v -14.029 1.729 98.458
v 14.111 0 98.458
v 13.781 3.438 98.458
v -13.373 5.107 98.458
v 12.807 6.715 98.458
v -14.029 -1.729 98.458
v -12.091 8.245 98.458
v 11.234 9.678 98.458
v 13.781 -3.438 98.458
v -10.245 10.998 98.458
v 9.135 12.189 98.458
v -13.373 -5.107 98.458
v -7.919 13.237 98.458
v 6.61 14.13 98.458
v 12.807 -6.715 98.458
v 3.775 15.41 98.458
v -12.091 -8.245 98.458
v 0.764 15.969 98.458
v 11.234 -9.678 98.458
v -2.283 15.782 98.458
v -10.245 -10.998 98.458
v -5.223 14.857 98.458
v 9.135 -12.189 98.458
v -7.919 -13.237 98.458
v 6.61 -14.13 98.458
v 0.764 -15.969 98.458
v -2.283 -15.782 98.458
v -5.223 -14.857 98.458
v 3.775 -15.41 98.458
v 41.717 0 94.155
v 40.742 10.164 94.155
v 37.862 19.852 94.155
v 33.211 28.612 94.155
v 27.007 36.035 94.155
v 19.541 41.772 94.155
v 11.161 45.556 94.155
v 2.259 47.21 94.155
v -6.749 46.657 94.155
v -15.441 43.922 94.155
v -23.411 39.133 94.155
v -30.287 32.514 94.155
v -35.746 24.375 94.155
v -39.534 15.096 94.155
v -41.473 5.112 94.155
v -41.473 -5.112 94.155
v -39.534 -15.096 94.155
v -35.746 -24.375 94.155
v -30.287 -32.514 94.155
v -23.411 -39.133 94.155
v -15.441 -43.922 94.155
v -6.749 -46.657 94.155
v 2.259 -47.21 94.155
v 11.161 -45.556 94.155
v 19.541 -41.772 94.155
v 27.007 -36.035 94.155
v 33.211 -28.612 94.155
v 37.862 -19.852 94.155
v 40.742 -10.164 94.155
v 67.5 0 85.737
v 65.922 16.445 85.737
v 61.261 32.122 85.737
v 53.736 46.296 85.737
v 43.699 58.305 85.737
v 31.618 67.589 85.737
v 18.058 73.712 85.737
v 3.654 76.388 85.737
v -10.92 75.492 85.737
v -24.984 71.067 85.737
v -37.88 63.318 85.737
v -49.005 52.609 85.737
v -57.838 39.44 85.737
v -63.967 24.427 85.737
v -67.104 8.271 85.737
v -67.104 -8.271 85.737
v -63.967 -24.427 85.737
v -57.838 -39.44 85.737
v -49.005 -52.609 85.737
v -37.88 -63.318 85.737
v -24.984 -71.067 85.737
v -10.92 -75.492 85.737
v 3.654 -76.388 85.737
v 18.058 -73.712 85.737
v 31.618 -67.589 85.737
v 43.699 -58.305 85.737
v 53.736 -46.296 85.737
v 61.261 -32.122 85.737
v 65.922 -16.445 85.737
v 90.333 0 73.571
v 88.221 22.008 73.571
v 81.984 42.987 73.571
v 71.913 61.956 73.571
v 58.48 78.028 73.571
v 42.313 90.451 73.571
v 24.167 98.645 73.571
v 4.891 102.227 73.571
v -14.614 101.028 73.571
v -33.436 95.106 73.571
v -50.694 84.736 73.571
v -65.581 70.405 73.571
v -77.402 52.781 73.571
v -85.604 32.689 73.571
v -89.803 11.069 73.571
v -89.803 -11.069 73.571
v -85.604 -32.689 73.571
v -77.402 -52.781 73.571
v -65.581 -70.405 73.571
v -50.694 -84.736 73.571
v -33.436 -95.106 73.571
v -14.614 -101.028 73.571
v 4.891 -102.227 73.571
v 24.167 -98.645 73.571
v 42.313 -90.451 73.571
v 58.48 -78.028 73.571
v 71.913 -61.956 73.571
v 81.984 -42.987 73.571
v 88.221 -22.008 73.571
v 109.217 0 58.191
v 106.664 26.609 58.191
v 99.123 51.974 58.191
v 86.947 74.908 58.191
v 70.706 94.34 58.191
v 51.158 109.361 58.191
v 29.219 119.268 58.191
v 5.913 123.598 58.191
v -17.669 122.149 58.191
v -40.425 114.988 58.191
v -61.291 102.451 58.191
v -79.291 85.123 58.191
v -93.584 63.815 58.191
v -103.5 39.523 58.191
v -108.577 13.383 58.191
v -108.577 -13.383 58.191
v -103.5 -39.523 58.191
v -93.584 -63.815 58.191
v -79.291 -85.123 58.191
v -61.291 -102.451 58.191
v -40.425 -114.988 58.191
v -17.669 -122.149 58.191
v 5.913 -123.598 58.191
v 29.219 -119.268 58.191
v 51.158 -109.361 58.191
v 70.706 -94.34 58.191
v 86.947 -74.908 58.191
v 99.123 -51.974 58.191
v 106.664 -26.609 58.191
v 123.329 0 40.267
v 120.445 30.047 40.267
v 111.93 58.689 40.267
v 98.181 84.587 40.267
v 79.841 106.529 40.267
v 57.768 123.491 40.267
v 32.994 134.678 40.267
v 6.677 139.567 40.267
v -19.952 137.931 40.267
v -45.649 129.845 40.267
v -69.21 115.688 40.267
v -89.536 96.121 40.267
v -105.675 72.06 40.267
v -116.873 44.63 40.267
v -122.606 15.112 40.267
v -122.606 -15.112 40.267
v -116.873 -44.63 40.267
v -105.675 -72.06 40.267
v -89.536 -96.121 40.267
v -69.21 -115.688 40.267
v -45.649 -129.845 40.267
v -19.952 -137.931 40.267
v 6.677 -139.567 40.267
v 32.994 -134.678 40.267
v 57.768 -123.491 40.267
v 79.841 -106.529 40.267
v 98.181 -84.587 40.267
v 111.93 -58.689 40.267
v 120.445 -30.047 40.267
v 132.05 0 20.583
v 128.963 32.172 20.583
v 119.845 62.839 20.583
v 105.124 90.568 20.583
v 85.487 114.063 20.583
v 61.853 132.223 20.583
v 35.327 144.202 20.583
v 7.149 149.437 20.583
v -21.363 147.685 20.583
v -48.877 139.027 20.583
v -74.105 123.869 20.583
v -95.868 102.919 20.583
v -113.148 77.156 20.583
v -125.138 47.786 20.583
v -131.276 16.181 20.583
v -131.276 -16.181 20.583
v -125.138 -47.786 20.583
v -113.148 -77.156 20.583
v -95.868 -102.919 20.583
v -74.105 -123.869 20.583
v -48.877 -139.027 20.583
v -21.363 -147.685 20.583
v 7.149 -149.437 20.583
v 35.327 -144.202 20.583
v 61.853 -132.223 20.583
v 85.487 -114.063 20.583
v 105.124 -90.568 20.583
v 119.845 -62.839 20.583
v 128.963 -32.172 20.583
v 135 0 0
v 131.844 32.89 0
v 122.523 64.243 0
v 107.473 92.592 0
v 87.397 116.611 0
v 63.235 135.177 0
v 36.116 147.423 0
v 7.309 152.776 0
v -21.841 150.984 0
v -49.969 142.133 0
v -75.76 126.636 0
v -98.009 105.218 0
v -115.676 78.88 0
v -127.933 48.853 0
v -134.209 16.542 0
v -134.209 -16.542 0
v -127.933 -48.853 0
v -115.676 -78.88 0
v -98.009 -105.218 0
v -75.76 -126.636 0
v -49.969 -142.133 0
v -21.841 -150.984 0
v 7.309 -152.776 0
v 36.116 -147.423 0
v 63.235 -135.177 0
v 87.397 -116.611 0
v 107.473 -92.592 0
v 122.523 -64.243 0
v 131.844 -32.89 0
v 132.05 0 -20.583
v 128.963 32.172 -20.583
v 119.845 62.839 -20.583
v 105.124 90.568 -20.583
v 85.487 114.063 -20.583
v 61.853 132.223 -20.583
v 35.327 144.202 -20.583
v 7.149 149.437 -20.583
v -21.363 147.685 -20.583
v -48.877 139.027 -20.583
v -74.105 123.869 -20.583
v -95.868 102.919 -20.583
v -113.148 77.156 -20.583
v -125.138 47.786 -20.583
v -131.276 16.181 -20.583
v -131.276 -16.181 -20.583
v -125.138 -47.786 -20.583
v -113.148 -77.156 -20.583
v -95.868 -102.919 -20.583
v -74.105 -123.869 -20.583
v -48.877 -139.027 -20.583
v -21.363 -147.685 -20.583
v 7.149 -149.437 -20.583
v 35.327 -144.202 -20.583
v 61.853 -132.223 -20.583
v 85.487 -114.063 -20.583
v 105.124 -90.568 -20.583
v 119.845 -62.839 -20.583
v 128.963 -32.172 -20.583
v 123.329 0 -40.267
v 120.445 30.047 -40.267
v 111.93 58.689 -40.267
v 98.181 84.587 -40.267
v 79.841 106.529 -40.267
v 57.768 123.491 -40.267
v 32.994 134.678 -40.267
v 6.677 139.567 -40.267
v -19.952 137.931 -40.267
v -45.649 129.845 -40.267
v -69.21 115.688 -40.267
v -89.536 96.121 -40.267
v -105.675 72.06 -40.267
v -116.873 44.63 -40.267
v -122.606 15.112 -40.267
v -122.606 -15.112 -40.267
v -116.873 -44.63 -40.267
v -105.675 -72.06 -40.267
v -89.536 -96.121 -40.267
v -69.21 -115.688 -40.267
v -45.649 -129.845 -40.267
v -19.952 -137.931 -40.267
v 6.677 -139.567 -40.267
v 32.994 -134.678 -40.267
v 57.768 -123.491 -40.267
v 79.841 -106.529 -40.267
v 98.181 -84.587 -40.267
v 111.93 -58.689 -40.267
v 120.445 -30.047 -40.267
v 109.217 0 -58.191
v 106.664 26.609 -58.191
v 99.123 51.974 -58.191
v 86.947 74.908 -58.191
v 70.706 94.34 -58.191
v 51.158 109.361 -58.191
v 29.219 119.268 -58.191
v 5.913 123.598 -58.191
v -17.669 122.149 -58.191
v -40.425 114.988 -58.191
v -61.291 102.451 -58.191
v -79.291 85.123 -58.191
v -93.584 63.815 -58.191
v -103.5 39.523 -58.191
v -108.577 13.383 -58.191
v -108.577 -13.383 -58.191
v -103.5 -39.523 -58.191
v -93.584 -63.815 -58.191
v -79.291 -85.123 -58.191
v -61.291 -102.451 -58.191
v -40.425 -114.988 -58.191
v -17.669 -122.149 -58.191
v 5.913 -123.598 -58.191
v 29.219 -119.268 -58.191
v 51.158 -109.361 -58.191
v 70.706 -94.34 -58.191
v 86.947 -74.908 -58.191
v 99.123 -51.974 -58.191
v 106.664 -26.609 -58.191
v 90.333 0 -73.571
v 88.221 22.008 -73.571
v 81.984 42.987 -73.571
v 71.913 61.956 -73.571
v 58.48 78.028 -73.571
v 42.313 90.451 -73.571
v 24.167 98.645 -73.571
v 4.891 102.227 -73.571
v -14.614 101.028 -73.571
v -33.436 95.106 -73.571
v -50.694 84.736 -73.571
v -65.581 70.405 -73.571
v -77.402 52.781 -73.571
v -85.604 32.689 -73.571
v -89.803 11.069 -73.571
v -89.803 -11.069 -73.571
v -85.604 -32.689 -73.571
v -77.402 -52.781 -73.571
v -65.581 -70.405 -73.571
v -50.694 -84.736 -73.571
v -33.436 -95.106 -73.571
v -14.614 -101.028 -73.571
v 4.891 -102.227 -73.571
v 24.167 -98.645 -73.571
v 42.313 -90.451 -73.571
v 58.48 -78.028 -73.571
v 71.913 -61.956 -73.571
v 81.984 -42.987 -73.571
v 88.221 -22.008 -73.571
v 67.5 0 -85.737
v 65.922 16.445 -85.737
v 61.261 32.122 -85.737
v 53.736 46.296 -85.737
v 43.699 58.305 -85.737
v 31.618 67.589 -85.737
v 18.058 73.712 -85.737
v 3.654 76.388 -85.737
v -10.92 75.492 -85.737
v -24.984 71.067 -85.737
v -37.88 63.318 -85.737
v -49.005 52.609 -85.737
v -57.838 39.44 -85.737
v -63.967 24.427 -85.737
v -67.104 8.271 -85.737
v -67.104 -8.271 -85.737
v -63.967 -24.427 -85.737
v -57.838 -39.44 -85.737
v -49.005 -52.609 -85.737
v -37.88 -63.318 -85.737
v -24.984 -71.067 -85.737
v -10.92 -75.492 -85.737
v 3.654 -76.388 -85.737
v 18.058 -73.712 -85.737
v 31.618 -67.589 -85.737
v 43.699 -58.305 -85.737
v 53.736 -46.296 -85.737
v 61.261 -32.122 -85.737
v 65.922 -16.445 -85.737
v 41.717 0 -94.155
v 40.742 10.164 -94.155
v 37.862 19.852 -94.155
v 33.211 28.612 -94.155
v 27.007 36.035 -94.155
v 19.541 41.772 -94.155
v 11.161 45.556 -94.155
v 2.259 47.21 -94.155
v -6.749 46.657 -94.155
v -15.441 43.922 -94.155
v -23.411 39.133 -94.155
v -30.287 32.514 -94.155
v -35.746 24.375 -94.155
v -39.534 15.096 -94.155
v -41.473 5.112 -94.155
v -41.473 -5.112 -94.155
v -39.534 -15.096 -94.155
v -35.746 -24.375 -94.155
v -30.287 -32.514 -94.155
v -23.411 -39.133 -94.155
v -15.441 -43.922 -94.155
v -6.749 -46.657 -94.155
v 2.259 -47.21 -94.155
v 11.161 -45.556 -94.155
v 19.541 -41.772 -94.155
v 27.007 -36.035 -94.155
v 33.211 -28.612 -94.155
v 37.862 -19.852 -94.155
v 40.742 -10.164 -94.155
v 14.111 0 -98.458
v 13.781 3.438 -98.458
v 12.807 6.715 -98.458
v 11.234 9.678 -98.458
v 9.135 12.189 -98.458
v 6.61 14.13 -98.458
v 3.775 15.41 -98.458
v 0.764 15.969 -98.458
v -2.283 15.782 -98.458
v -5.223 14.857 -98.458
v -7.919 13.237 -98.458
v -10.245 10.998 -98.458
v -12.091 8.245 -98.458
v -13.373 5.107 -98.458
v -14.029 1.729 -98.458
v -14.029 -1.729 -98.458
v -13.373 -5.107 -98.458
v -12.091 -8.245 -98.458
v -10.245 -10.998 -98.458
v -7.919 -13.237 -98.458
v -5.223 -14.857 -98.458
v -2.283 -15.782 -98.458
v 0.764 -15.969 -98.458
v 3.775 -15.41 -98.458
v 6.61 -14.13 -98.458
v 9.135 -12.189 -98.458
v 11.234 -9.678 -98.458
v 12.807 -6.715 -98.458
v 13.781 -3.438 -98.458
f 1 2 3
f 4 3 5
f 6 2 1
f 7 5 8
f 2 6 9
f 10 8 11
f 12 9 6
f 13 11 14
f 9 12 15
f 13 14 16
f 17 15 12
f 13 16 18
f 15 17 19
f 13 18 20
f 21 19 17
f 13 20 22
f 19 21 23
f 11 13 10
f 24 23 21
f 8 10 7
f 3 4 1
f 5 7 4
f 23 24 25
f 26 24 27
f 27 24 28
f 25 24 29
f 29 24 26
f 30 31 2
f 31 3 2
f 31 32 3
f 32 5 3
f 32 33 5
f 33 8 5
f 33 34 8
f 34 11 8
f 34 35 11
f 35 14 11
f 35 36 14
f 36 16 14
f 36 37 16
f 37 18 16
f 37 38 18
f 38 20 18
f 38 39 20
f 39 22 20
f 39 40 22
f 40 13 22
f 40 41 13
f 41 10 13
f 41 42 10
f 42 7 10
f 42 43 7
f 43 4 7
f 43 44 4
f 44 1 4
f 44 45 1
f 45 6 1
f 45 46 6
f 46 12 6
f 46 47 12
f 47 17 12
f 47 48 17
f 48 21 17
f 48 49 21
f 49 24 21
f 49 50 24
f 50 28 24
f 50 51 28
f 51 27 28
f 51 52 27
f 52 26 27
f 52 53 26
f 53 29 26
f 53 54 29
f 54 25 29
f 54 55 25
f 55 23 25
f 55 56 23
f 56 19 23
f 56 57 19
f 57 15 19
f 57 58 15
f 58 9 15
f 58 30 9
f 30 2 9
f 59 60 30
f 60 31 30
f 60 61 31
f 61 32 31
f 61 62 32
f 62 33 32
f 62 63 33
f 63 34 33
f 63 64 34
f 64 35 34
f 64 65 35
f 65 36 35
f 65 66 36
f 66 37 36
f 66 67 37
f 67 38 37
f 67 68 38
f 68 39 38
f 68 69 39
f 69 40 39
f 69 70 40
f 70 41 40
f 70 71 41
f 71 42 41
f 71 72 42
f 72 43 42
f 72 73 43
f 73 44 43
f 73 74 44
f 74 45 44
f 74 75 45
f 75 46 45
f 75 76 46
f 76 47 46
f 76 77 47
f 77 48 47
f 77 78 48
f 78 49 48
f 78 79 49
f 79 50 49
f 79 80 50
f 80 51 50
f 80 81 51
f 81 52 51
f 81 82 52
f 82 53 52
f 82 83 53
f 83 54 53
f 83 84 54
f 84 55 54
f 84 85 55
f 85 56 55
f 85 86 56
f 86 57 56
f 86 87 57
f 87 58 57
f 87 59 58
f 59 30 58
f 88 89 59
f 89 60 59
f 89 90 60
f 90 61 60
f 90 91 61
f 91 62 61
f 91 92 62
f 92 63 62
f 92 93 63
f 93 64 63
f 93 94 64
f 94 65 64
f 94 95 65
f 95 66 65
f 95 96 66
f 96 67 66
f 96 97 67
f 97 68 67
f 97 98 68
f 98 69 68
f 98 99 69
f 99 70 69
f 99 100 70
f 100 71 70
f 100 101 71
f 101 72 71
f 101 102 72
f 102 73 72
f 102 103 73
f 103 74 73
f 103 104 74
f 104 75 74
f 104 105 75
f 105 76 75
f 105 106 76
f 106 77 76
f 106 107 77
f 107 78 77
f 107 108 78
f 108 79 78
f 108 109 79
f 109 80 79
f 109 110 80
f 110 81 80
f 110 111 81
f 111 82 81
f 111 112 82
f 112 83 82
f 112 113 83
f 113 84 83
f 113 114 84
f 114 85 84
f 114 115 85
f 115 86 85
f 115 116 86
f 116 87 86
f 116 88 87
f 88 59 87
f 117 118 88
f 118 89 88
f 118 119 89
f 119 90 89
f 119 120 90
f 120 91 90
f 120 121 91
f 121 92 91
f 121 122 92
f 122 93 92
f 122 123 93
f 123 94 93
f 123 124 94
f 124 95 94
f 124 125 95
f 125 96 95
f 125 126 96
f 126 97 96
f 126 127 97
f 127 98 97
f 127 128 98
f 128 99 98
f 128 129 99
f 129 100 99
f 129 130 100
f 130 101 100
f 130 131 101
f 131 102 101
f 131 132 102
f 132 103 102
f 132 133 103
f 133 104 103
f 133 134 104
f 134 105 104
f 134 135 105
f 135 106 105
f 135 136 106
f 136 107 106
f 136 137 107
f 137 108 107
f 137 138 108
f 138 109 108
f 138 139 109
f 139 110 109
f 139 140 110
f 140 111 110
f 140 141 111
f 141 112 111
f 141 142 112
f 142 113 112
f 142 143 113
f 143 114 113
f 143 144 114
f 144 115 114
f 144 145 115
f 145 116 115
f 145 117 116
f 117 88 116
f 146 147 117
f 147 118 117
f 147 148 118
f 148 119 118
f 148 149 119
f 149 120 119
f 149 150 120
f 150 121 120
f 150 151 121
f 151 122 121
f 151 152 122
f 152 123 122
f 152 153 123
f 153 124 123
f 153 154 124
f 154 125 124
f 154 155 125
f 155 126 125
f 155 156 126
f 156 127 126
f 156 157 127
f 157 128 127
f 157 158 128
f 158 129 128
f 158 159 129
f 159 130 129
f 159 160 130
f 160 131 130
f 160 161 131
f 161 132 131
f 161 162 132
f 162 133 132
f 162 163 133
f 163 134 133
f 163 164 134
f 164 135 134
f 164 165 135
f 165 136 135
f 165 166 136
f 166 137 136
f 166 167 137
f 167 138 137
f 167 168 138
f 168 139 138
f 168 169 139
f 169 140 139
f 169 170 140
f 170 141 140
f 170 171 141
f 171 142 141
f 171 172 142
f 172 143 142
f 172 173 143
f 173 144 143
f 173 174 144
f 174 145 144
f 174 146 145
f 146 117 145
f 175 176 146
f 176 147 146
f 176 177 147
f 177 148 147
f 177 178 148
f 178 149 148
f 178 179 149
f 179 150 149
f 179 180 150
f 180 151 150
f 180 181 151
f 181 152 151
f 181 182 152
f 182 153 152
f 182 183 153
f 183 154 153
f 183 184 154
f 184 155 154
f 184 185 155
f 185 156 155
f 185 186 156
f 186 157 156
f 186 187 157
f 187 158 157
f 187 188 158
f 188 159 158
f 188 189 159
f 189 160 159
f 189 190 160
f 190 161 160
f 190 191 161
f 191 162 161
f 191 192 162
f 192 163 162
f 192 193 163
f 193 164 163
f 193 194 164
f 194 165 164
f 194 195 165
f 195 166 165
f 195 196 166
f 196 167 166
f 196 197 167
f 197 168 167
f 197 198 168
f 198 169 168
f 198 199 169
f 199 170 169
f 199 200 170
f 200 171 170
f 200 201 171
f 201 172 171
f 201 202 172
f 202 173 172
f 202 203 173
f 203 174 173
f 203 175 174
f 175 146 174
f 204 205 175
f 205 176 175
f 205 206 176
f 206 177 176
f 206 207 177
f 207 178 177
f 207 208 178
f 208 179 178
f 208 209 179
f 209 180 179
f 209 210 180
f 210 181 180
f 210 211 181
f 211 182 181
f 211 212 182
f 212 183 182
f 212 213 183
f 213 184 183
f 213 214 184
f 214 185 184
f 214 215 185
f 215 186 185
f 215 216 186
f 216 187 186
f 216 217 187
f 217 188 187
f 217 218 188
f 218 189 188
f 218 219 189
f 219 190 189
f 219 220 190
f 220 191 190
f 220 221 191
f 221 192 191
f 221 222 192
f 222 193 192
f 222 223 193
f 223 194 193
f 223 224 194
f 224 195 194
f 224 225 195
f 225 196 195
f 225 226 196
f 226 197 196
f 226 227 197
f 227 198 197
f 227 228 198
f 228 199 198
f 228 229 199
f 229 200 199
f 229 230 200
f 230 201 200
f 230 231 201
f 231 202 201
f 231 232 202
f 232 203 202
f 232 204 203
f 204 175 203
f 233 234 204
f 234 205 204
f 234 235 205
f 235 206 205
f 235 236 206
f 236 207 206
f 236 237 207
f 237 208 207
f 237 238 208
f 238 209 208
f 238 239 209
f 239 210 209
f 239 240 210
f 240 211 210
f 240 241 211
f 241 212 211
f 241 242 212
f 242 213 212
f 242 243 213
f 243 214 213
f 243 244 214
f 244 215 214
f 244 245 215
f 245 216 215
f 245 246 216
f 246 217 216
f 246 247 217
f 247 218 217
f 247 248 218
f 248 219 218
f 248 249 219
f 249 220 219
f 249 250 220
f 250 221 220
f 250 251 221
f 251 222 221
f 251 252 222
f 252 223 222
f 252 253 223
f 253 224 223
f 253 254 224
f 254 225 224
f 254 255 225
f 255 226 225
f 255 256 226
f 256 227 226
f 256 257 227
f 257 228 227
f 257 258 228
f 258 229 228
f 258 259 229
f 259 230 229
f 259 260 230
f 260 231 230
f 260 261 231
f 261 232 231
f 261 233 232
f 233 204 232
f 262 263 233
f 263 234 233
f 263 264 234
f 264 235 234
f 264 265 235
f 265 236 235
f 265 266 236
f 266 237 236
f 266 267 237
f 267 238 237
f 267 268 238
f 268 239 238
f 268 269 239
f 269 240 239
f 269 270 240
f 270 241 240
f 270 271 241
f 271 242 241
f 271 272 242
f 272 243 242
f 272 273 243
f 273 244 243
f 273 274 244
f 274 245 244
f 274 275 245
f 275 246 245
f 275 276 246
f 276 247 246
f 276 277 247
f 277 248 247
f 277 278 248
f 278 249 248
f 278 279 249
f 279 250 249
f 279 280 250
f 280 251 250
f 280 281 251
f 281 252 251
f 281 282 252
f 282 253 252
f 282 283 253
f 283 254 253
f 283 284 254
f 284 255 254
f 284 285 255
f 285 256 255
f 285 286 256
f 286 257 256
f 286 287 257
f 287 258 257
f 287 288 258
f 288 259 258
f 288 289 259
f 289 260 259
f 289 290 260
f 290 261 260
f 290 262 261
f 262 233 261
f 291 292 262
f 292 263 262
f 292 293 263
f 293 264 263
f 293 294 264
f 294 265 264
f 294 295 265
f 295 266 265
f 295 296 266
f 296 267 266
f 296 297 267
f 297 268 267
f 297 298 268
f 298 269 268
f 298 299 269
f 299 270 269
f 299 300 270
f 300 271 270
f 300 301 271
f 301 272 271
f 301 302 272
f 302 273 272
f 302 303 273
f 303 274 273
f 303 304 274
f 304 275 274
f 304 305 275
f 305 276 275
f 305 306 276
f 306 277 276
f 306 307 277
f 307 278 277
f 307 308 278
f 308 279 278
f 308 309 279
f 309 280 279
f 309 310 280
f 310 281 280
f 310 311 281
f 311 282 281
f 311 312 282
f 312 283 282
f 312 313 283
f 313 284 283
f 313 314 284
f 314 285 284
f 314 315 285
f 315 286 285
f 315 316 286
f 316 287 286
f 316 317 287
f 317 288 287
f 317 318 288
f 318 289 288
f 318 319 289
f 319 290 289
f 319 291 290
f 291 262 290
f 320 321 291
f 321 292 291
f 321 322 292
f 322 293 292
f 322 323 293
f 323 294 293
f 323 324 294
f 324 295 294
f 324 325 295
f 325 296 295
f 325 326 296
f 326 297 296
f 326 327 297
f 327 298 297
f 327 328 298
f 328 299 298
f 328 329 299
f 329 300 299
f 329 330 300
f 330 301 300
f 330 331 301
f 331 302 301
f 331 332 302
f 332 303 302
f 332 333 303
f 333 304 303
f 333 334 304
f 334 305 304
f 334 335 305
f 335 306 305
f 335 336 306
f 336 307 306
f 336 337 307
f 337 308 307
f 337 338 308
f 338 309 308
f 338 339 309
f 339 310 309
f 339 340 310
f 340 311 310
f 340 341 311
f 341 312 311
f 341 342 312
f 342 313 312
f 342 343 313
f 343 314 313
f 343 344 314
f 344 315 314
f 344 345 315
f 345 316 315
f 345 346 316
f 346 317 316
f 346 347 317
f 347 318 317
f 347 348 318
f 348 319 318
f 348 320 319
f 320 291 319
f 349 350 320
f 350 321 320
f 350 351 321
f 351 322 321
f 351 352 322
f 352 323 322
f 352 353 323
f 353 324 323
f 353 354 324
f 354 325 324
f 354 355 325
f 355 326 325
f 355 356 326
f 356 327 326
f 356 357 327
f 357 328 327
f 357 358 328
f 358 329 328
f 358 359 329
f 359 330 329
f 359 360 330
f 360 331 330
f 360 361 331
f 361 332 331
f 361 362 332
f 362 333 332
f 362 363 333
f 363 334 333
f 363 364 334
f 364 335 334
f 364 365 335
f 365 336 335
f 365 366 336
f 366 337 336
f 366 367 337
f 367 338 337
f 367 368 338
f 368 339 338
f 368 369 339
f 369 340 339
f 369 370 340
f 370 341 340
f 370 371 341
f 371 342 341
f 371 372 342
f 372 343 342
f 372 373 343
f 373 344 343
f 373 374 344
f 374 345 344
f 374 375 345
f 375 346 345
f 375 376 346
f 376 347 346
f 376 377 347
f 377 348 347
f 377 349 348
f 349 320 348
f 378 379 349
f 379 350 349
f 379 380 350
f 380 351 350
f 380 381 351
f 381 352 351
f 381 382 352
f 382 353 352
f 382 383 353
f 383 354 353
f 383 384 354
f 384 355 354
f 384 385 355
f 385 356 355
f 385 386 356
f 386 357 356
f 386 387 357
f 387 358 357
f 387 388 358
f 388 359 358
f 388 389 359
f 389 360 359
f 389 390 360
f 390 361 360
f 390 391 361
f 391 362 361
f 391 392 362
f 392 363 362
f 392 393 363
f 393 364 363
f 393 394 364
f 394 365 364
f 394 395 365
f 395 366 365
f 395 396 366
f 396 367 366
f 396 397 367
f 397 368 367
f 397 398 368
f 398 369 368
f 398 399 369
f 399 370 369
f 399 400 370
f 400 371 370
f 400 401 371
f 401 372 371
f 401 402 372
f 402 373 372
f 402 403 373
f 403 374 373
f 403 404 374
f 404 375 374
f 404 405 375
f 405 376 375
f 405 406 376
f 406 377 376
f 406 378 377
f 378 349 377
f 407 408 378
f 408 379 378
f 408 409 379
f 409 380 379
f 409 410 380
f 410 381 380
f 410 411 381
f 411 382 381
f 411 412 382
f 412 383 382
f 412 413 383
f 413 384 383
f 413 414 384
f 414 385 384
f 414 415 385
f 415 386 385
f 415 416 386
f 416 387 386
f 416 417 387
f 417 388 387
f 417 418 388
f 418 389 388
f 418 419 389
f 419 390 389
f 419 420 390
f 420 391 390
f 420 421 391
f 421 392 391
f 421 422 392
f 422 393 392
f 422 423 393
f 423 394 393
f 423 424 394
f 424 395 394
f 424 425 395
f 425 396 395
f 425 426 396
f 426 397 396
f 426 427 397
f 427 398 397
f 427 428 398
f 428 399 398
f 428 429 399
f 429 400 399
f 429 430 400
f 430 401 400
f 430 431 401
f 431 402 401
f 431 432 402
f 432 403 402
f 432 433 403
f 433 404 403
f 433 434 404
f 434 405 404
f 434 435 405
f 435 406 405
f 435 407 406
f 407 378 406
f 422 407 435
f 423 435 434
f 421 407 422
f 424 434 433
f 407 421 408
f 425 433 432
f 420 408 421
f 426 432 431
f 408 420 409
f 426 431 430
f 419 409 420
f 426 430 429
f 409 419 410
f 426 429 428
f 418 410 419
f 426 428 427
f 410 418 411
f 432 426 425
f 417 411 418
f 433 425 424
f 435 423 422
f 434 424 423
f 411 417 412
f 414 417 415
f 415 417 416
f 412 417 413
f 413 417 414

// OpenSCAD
// Generated by SolidPython 1.0.1 on 2020-07-29 00:46:52


scale(v = [15, 17, 11]) {
	sphere(r = 9);
}
/***********************************************
*********      SolidPython code:      **********
************************************************
 
# import packages: SolidPython
from solid import *
from solid.utils import *
from itertools import chain, combinations, permutations


class Resize:

    def __init__(self, scad_file):
        self.scad_file = scad_file
        #self.scad_file = import_scad(scad_file)
        # cone/cylinder param:
        self.r1 = 0
        self.r2 = 0
        self.h = 0
        # rectangular prism param:
        self.w = 0
        self.l = 0
        # ellipse param:
        self.r = 0

    # import OpenScad code (file name corresponds to shape)


    # classify shape + parameters
    def assign(self, param1, param2, param3):
        if self.scad_file == 'cone.scad':
            self.r1 = param1
            self.r2 = param2
            self.h = param3
        elif self.scad_file == 'cylinder.scad':
            self.r1 = param1
            self.r2 = param2
            self.h = param3
        elif self.scad_file == 'rectangularPrism.scad':
            self.h = param1
            self.l = param2
            self.w = param3
        else:
            self.r = param1
            self.h = param2

    # resize parameters
    def iterate(self):
        x = range(3, 20, 2)
        i = 1
        if self.scad_file == 'cone.scad':
            tempList = list(permutations(x, 2))
            for temp in tempList:
                param1 = temp[0]
                param2 = temp[1]
                filepath = 'produced_scad_files/' + 'cone' + str(param1) + '_' + str(param2) + '_' + '.scad'
                scad_render_to_file(cylinder(h=param1, r1=param2, r2=0), filepath)

        elif self.scad_file == 'cylinder.scad':
            tempList = list(permutations(x, 3))
            for temp in tempList:
                param1 = temp[0]
                param2 = temp[1]
                filepath = 'produced_scad_files/' + 'cylinder' + str(param1) + '_' + str(param2) + '_' + '.scad'
                scad_render_to_file(cylinder(h=param1, r1=param2, r2=param2), filepath)

        elif self.scad_file == 'rectangularPrism.scad':
            tempList = list(permutations(x, 3))
            for temp in tempList:
                param1 = temp[0]
                param2 = temp[1]
                param3 = temp[2]
                filepath = 'produced_scad_files/' + 'rectangularPrism' + str(param1) + '_' + str(param2) + '_' + str(
                    param3) + '.scad'
                scad_render_to_file(cube(size=(param1, param2, param3)), filepath)

        elif self.scad_file == 'ellipse.scad':
            tempList = list(permutations(x, 4))
            for temp in tempList:
                param1 = temp[0]
                param2 = temp[1]
                param3 = temp[2]
                param4 = temp[3]
                filepath = 'produced_scad_files/' + 'ellipse' + str(param1) + '_' + str(param2) + '_' + str(param3) + '_' + str(param4) + '.scad'
                scad_render_to_file(scale([param1, param2, param3])(sphere(r=param4)), filepath)

    def render_to_scadfile(self):
        scad_render_to_file(scad, 'example.scad') 
 
************************************************/
